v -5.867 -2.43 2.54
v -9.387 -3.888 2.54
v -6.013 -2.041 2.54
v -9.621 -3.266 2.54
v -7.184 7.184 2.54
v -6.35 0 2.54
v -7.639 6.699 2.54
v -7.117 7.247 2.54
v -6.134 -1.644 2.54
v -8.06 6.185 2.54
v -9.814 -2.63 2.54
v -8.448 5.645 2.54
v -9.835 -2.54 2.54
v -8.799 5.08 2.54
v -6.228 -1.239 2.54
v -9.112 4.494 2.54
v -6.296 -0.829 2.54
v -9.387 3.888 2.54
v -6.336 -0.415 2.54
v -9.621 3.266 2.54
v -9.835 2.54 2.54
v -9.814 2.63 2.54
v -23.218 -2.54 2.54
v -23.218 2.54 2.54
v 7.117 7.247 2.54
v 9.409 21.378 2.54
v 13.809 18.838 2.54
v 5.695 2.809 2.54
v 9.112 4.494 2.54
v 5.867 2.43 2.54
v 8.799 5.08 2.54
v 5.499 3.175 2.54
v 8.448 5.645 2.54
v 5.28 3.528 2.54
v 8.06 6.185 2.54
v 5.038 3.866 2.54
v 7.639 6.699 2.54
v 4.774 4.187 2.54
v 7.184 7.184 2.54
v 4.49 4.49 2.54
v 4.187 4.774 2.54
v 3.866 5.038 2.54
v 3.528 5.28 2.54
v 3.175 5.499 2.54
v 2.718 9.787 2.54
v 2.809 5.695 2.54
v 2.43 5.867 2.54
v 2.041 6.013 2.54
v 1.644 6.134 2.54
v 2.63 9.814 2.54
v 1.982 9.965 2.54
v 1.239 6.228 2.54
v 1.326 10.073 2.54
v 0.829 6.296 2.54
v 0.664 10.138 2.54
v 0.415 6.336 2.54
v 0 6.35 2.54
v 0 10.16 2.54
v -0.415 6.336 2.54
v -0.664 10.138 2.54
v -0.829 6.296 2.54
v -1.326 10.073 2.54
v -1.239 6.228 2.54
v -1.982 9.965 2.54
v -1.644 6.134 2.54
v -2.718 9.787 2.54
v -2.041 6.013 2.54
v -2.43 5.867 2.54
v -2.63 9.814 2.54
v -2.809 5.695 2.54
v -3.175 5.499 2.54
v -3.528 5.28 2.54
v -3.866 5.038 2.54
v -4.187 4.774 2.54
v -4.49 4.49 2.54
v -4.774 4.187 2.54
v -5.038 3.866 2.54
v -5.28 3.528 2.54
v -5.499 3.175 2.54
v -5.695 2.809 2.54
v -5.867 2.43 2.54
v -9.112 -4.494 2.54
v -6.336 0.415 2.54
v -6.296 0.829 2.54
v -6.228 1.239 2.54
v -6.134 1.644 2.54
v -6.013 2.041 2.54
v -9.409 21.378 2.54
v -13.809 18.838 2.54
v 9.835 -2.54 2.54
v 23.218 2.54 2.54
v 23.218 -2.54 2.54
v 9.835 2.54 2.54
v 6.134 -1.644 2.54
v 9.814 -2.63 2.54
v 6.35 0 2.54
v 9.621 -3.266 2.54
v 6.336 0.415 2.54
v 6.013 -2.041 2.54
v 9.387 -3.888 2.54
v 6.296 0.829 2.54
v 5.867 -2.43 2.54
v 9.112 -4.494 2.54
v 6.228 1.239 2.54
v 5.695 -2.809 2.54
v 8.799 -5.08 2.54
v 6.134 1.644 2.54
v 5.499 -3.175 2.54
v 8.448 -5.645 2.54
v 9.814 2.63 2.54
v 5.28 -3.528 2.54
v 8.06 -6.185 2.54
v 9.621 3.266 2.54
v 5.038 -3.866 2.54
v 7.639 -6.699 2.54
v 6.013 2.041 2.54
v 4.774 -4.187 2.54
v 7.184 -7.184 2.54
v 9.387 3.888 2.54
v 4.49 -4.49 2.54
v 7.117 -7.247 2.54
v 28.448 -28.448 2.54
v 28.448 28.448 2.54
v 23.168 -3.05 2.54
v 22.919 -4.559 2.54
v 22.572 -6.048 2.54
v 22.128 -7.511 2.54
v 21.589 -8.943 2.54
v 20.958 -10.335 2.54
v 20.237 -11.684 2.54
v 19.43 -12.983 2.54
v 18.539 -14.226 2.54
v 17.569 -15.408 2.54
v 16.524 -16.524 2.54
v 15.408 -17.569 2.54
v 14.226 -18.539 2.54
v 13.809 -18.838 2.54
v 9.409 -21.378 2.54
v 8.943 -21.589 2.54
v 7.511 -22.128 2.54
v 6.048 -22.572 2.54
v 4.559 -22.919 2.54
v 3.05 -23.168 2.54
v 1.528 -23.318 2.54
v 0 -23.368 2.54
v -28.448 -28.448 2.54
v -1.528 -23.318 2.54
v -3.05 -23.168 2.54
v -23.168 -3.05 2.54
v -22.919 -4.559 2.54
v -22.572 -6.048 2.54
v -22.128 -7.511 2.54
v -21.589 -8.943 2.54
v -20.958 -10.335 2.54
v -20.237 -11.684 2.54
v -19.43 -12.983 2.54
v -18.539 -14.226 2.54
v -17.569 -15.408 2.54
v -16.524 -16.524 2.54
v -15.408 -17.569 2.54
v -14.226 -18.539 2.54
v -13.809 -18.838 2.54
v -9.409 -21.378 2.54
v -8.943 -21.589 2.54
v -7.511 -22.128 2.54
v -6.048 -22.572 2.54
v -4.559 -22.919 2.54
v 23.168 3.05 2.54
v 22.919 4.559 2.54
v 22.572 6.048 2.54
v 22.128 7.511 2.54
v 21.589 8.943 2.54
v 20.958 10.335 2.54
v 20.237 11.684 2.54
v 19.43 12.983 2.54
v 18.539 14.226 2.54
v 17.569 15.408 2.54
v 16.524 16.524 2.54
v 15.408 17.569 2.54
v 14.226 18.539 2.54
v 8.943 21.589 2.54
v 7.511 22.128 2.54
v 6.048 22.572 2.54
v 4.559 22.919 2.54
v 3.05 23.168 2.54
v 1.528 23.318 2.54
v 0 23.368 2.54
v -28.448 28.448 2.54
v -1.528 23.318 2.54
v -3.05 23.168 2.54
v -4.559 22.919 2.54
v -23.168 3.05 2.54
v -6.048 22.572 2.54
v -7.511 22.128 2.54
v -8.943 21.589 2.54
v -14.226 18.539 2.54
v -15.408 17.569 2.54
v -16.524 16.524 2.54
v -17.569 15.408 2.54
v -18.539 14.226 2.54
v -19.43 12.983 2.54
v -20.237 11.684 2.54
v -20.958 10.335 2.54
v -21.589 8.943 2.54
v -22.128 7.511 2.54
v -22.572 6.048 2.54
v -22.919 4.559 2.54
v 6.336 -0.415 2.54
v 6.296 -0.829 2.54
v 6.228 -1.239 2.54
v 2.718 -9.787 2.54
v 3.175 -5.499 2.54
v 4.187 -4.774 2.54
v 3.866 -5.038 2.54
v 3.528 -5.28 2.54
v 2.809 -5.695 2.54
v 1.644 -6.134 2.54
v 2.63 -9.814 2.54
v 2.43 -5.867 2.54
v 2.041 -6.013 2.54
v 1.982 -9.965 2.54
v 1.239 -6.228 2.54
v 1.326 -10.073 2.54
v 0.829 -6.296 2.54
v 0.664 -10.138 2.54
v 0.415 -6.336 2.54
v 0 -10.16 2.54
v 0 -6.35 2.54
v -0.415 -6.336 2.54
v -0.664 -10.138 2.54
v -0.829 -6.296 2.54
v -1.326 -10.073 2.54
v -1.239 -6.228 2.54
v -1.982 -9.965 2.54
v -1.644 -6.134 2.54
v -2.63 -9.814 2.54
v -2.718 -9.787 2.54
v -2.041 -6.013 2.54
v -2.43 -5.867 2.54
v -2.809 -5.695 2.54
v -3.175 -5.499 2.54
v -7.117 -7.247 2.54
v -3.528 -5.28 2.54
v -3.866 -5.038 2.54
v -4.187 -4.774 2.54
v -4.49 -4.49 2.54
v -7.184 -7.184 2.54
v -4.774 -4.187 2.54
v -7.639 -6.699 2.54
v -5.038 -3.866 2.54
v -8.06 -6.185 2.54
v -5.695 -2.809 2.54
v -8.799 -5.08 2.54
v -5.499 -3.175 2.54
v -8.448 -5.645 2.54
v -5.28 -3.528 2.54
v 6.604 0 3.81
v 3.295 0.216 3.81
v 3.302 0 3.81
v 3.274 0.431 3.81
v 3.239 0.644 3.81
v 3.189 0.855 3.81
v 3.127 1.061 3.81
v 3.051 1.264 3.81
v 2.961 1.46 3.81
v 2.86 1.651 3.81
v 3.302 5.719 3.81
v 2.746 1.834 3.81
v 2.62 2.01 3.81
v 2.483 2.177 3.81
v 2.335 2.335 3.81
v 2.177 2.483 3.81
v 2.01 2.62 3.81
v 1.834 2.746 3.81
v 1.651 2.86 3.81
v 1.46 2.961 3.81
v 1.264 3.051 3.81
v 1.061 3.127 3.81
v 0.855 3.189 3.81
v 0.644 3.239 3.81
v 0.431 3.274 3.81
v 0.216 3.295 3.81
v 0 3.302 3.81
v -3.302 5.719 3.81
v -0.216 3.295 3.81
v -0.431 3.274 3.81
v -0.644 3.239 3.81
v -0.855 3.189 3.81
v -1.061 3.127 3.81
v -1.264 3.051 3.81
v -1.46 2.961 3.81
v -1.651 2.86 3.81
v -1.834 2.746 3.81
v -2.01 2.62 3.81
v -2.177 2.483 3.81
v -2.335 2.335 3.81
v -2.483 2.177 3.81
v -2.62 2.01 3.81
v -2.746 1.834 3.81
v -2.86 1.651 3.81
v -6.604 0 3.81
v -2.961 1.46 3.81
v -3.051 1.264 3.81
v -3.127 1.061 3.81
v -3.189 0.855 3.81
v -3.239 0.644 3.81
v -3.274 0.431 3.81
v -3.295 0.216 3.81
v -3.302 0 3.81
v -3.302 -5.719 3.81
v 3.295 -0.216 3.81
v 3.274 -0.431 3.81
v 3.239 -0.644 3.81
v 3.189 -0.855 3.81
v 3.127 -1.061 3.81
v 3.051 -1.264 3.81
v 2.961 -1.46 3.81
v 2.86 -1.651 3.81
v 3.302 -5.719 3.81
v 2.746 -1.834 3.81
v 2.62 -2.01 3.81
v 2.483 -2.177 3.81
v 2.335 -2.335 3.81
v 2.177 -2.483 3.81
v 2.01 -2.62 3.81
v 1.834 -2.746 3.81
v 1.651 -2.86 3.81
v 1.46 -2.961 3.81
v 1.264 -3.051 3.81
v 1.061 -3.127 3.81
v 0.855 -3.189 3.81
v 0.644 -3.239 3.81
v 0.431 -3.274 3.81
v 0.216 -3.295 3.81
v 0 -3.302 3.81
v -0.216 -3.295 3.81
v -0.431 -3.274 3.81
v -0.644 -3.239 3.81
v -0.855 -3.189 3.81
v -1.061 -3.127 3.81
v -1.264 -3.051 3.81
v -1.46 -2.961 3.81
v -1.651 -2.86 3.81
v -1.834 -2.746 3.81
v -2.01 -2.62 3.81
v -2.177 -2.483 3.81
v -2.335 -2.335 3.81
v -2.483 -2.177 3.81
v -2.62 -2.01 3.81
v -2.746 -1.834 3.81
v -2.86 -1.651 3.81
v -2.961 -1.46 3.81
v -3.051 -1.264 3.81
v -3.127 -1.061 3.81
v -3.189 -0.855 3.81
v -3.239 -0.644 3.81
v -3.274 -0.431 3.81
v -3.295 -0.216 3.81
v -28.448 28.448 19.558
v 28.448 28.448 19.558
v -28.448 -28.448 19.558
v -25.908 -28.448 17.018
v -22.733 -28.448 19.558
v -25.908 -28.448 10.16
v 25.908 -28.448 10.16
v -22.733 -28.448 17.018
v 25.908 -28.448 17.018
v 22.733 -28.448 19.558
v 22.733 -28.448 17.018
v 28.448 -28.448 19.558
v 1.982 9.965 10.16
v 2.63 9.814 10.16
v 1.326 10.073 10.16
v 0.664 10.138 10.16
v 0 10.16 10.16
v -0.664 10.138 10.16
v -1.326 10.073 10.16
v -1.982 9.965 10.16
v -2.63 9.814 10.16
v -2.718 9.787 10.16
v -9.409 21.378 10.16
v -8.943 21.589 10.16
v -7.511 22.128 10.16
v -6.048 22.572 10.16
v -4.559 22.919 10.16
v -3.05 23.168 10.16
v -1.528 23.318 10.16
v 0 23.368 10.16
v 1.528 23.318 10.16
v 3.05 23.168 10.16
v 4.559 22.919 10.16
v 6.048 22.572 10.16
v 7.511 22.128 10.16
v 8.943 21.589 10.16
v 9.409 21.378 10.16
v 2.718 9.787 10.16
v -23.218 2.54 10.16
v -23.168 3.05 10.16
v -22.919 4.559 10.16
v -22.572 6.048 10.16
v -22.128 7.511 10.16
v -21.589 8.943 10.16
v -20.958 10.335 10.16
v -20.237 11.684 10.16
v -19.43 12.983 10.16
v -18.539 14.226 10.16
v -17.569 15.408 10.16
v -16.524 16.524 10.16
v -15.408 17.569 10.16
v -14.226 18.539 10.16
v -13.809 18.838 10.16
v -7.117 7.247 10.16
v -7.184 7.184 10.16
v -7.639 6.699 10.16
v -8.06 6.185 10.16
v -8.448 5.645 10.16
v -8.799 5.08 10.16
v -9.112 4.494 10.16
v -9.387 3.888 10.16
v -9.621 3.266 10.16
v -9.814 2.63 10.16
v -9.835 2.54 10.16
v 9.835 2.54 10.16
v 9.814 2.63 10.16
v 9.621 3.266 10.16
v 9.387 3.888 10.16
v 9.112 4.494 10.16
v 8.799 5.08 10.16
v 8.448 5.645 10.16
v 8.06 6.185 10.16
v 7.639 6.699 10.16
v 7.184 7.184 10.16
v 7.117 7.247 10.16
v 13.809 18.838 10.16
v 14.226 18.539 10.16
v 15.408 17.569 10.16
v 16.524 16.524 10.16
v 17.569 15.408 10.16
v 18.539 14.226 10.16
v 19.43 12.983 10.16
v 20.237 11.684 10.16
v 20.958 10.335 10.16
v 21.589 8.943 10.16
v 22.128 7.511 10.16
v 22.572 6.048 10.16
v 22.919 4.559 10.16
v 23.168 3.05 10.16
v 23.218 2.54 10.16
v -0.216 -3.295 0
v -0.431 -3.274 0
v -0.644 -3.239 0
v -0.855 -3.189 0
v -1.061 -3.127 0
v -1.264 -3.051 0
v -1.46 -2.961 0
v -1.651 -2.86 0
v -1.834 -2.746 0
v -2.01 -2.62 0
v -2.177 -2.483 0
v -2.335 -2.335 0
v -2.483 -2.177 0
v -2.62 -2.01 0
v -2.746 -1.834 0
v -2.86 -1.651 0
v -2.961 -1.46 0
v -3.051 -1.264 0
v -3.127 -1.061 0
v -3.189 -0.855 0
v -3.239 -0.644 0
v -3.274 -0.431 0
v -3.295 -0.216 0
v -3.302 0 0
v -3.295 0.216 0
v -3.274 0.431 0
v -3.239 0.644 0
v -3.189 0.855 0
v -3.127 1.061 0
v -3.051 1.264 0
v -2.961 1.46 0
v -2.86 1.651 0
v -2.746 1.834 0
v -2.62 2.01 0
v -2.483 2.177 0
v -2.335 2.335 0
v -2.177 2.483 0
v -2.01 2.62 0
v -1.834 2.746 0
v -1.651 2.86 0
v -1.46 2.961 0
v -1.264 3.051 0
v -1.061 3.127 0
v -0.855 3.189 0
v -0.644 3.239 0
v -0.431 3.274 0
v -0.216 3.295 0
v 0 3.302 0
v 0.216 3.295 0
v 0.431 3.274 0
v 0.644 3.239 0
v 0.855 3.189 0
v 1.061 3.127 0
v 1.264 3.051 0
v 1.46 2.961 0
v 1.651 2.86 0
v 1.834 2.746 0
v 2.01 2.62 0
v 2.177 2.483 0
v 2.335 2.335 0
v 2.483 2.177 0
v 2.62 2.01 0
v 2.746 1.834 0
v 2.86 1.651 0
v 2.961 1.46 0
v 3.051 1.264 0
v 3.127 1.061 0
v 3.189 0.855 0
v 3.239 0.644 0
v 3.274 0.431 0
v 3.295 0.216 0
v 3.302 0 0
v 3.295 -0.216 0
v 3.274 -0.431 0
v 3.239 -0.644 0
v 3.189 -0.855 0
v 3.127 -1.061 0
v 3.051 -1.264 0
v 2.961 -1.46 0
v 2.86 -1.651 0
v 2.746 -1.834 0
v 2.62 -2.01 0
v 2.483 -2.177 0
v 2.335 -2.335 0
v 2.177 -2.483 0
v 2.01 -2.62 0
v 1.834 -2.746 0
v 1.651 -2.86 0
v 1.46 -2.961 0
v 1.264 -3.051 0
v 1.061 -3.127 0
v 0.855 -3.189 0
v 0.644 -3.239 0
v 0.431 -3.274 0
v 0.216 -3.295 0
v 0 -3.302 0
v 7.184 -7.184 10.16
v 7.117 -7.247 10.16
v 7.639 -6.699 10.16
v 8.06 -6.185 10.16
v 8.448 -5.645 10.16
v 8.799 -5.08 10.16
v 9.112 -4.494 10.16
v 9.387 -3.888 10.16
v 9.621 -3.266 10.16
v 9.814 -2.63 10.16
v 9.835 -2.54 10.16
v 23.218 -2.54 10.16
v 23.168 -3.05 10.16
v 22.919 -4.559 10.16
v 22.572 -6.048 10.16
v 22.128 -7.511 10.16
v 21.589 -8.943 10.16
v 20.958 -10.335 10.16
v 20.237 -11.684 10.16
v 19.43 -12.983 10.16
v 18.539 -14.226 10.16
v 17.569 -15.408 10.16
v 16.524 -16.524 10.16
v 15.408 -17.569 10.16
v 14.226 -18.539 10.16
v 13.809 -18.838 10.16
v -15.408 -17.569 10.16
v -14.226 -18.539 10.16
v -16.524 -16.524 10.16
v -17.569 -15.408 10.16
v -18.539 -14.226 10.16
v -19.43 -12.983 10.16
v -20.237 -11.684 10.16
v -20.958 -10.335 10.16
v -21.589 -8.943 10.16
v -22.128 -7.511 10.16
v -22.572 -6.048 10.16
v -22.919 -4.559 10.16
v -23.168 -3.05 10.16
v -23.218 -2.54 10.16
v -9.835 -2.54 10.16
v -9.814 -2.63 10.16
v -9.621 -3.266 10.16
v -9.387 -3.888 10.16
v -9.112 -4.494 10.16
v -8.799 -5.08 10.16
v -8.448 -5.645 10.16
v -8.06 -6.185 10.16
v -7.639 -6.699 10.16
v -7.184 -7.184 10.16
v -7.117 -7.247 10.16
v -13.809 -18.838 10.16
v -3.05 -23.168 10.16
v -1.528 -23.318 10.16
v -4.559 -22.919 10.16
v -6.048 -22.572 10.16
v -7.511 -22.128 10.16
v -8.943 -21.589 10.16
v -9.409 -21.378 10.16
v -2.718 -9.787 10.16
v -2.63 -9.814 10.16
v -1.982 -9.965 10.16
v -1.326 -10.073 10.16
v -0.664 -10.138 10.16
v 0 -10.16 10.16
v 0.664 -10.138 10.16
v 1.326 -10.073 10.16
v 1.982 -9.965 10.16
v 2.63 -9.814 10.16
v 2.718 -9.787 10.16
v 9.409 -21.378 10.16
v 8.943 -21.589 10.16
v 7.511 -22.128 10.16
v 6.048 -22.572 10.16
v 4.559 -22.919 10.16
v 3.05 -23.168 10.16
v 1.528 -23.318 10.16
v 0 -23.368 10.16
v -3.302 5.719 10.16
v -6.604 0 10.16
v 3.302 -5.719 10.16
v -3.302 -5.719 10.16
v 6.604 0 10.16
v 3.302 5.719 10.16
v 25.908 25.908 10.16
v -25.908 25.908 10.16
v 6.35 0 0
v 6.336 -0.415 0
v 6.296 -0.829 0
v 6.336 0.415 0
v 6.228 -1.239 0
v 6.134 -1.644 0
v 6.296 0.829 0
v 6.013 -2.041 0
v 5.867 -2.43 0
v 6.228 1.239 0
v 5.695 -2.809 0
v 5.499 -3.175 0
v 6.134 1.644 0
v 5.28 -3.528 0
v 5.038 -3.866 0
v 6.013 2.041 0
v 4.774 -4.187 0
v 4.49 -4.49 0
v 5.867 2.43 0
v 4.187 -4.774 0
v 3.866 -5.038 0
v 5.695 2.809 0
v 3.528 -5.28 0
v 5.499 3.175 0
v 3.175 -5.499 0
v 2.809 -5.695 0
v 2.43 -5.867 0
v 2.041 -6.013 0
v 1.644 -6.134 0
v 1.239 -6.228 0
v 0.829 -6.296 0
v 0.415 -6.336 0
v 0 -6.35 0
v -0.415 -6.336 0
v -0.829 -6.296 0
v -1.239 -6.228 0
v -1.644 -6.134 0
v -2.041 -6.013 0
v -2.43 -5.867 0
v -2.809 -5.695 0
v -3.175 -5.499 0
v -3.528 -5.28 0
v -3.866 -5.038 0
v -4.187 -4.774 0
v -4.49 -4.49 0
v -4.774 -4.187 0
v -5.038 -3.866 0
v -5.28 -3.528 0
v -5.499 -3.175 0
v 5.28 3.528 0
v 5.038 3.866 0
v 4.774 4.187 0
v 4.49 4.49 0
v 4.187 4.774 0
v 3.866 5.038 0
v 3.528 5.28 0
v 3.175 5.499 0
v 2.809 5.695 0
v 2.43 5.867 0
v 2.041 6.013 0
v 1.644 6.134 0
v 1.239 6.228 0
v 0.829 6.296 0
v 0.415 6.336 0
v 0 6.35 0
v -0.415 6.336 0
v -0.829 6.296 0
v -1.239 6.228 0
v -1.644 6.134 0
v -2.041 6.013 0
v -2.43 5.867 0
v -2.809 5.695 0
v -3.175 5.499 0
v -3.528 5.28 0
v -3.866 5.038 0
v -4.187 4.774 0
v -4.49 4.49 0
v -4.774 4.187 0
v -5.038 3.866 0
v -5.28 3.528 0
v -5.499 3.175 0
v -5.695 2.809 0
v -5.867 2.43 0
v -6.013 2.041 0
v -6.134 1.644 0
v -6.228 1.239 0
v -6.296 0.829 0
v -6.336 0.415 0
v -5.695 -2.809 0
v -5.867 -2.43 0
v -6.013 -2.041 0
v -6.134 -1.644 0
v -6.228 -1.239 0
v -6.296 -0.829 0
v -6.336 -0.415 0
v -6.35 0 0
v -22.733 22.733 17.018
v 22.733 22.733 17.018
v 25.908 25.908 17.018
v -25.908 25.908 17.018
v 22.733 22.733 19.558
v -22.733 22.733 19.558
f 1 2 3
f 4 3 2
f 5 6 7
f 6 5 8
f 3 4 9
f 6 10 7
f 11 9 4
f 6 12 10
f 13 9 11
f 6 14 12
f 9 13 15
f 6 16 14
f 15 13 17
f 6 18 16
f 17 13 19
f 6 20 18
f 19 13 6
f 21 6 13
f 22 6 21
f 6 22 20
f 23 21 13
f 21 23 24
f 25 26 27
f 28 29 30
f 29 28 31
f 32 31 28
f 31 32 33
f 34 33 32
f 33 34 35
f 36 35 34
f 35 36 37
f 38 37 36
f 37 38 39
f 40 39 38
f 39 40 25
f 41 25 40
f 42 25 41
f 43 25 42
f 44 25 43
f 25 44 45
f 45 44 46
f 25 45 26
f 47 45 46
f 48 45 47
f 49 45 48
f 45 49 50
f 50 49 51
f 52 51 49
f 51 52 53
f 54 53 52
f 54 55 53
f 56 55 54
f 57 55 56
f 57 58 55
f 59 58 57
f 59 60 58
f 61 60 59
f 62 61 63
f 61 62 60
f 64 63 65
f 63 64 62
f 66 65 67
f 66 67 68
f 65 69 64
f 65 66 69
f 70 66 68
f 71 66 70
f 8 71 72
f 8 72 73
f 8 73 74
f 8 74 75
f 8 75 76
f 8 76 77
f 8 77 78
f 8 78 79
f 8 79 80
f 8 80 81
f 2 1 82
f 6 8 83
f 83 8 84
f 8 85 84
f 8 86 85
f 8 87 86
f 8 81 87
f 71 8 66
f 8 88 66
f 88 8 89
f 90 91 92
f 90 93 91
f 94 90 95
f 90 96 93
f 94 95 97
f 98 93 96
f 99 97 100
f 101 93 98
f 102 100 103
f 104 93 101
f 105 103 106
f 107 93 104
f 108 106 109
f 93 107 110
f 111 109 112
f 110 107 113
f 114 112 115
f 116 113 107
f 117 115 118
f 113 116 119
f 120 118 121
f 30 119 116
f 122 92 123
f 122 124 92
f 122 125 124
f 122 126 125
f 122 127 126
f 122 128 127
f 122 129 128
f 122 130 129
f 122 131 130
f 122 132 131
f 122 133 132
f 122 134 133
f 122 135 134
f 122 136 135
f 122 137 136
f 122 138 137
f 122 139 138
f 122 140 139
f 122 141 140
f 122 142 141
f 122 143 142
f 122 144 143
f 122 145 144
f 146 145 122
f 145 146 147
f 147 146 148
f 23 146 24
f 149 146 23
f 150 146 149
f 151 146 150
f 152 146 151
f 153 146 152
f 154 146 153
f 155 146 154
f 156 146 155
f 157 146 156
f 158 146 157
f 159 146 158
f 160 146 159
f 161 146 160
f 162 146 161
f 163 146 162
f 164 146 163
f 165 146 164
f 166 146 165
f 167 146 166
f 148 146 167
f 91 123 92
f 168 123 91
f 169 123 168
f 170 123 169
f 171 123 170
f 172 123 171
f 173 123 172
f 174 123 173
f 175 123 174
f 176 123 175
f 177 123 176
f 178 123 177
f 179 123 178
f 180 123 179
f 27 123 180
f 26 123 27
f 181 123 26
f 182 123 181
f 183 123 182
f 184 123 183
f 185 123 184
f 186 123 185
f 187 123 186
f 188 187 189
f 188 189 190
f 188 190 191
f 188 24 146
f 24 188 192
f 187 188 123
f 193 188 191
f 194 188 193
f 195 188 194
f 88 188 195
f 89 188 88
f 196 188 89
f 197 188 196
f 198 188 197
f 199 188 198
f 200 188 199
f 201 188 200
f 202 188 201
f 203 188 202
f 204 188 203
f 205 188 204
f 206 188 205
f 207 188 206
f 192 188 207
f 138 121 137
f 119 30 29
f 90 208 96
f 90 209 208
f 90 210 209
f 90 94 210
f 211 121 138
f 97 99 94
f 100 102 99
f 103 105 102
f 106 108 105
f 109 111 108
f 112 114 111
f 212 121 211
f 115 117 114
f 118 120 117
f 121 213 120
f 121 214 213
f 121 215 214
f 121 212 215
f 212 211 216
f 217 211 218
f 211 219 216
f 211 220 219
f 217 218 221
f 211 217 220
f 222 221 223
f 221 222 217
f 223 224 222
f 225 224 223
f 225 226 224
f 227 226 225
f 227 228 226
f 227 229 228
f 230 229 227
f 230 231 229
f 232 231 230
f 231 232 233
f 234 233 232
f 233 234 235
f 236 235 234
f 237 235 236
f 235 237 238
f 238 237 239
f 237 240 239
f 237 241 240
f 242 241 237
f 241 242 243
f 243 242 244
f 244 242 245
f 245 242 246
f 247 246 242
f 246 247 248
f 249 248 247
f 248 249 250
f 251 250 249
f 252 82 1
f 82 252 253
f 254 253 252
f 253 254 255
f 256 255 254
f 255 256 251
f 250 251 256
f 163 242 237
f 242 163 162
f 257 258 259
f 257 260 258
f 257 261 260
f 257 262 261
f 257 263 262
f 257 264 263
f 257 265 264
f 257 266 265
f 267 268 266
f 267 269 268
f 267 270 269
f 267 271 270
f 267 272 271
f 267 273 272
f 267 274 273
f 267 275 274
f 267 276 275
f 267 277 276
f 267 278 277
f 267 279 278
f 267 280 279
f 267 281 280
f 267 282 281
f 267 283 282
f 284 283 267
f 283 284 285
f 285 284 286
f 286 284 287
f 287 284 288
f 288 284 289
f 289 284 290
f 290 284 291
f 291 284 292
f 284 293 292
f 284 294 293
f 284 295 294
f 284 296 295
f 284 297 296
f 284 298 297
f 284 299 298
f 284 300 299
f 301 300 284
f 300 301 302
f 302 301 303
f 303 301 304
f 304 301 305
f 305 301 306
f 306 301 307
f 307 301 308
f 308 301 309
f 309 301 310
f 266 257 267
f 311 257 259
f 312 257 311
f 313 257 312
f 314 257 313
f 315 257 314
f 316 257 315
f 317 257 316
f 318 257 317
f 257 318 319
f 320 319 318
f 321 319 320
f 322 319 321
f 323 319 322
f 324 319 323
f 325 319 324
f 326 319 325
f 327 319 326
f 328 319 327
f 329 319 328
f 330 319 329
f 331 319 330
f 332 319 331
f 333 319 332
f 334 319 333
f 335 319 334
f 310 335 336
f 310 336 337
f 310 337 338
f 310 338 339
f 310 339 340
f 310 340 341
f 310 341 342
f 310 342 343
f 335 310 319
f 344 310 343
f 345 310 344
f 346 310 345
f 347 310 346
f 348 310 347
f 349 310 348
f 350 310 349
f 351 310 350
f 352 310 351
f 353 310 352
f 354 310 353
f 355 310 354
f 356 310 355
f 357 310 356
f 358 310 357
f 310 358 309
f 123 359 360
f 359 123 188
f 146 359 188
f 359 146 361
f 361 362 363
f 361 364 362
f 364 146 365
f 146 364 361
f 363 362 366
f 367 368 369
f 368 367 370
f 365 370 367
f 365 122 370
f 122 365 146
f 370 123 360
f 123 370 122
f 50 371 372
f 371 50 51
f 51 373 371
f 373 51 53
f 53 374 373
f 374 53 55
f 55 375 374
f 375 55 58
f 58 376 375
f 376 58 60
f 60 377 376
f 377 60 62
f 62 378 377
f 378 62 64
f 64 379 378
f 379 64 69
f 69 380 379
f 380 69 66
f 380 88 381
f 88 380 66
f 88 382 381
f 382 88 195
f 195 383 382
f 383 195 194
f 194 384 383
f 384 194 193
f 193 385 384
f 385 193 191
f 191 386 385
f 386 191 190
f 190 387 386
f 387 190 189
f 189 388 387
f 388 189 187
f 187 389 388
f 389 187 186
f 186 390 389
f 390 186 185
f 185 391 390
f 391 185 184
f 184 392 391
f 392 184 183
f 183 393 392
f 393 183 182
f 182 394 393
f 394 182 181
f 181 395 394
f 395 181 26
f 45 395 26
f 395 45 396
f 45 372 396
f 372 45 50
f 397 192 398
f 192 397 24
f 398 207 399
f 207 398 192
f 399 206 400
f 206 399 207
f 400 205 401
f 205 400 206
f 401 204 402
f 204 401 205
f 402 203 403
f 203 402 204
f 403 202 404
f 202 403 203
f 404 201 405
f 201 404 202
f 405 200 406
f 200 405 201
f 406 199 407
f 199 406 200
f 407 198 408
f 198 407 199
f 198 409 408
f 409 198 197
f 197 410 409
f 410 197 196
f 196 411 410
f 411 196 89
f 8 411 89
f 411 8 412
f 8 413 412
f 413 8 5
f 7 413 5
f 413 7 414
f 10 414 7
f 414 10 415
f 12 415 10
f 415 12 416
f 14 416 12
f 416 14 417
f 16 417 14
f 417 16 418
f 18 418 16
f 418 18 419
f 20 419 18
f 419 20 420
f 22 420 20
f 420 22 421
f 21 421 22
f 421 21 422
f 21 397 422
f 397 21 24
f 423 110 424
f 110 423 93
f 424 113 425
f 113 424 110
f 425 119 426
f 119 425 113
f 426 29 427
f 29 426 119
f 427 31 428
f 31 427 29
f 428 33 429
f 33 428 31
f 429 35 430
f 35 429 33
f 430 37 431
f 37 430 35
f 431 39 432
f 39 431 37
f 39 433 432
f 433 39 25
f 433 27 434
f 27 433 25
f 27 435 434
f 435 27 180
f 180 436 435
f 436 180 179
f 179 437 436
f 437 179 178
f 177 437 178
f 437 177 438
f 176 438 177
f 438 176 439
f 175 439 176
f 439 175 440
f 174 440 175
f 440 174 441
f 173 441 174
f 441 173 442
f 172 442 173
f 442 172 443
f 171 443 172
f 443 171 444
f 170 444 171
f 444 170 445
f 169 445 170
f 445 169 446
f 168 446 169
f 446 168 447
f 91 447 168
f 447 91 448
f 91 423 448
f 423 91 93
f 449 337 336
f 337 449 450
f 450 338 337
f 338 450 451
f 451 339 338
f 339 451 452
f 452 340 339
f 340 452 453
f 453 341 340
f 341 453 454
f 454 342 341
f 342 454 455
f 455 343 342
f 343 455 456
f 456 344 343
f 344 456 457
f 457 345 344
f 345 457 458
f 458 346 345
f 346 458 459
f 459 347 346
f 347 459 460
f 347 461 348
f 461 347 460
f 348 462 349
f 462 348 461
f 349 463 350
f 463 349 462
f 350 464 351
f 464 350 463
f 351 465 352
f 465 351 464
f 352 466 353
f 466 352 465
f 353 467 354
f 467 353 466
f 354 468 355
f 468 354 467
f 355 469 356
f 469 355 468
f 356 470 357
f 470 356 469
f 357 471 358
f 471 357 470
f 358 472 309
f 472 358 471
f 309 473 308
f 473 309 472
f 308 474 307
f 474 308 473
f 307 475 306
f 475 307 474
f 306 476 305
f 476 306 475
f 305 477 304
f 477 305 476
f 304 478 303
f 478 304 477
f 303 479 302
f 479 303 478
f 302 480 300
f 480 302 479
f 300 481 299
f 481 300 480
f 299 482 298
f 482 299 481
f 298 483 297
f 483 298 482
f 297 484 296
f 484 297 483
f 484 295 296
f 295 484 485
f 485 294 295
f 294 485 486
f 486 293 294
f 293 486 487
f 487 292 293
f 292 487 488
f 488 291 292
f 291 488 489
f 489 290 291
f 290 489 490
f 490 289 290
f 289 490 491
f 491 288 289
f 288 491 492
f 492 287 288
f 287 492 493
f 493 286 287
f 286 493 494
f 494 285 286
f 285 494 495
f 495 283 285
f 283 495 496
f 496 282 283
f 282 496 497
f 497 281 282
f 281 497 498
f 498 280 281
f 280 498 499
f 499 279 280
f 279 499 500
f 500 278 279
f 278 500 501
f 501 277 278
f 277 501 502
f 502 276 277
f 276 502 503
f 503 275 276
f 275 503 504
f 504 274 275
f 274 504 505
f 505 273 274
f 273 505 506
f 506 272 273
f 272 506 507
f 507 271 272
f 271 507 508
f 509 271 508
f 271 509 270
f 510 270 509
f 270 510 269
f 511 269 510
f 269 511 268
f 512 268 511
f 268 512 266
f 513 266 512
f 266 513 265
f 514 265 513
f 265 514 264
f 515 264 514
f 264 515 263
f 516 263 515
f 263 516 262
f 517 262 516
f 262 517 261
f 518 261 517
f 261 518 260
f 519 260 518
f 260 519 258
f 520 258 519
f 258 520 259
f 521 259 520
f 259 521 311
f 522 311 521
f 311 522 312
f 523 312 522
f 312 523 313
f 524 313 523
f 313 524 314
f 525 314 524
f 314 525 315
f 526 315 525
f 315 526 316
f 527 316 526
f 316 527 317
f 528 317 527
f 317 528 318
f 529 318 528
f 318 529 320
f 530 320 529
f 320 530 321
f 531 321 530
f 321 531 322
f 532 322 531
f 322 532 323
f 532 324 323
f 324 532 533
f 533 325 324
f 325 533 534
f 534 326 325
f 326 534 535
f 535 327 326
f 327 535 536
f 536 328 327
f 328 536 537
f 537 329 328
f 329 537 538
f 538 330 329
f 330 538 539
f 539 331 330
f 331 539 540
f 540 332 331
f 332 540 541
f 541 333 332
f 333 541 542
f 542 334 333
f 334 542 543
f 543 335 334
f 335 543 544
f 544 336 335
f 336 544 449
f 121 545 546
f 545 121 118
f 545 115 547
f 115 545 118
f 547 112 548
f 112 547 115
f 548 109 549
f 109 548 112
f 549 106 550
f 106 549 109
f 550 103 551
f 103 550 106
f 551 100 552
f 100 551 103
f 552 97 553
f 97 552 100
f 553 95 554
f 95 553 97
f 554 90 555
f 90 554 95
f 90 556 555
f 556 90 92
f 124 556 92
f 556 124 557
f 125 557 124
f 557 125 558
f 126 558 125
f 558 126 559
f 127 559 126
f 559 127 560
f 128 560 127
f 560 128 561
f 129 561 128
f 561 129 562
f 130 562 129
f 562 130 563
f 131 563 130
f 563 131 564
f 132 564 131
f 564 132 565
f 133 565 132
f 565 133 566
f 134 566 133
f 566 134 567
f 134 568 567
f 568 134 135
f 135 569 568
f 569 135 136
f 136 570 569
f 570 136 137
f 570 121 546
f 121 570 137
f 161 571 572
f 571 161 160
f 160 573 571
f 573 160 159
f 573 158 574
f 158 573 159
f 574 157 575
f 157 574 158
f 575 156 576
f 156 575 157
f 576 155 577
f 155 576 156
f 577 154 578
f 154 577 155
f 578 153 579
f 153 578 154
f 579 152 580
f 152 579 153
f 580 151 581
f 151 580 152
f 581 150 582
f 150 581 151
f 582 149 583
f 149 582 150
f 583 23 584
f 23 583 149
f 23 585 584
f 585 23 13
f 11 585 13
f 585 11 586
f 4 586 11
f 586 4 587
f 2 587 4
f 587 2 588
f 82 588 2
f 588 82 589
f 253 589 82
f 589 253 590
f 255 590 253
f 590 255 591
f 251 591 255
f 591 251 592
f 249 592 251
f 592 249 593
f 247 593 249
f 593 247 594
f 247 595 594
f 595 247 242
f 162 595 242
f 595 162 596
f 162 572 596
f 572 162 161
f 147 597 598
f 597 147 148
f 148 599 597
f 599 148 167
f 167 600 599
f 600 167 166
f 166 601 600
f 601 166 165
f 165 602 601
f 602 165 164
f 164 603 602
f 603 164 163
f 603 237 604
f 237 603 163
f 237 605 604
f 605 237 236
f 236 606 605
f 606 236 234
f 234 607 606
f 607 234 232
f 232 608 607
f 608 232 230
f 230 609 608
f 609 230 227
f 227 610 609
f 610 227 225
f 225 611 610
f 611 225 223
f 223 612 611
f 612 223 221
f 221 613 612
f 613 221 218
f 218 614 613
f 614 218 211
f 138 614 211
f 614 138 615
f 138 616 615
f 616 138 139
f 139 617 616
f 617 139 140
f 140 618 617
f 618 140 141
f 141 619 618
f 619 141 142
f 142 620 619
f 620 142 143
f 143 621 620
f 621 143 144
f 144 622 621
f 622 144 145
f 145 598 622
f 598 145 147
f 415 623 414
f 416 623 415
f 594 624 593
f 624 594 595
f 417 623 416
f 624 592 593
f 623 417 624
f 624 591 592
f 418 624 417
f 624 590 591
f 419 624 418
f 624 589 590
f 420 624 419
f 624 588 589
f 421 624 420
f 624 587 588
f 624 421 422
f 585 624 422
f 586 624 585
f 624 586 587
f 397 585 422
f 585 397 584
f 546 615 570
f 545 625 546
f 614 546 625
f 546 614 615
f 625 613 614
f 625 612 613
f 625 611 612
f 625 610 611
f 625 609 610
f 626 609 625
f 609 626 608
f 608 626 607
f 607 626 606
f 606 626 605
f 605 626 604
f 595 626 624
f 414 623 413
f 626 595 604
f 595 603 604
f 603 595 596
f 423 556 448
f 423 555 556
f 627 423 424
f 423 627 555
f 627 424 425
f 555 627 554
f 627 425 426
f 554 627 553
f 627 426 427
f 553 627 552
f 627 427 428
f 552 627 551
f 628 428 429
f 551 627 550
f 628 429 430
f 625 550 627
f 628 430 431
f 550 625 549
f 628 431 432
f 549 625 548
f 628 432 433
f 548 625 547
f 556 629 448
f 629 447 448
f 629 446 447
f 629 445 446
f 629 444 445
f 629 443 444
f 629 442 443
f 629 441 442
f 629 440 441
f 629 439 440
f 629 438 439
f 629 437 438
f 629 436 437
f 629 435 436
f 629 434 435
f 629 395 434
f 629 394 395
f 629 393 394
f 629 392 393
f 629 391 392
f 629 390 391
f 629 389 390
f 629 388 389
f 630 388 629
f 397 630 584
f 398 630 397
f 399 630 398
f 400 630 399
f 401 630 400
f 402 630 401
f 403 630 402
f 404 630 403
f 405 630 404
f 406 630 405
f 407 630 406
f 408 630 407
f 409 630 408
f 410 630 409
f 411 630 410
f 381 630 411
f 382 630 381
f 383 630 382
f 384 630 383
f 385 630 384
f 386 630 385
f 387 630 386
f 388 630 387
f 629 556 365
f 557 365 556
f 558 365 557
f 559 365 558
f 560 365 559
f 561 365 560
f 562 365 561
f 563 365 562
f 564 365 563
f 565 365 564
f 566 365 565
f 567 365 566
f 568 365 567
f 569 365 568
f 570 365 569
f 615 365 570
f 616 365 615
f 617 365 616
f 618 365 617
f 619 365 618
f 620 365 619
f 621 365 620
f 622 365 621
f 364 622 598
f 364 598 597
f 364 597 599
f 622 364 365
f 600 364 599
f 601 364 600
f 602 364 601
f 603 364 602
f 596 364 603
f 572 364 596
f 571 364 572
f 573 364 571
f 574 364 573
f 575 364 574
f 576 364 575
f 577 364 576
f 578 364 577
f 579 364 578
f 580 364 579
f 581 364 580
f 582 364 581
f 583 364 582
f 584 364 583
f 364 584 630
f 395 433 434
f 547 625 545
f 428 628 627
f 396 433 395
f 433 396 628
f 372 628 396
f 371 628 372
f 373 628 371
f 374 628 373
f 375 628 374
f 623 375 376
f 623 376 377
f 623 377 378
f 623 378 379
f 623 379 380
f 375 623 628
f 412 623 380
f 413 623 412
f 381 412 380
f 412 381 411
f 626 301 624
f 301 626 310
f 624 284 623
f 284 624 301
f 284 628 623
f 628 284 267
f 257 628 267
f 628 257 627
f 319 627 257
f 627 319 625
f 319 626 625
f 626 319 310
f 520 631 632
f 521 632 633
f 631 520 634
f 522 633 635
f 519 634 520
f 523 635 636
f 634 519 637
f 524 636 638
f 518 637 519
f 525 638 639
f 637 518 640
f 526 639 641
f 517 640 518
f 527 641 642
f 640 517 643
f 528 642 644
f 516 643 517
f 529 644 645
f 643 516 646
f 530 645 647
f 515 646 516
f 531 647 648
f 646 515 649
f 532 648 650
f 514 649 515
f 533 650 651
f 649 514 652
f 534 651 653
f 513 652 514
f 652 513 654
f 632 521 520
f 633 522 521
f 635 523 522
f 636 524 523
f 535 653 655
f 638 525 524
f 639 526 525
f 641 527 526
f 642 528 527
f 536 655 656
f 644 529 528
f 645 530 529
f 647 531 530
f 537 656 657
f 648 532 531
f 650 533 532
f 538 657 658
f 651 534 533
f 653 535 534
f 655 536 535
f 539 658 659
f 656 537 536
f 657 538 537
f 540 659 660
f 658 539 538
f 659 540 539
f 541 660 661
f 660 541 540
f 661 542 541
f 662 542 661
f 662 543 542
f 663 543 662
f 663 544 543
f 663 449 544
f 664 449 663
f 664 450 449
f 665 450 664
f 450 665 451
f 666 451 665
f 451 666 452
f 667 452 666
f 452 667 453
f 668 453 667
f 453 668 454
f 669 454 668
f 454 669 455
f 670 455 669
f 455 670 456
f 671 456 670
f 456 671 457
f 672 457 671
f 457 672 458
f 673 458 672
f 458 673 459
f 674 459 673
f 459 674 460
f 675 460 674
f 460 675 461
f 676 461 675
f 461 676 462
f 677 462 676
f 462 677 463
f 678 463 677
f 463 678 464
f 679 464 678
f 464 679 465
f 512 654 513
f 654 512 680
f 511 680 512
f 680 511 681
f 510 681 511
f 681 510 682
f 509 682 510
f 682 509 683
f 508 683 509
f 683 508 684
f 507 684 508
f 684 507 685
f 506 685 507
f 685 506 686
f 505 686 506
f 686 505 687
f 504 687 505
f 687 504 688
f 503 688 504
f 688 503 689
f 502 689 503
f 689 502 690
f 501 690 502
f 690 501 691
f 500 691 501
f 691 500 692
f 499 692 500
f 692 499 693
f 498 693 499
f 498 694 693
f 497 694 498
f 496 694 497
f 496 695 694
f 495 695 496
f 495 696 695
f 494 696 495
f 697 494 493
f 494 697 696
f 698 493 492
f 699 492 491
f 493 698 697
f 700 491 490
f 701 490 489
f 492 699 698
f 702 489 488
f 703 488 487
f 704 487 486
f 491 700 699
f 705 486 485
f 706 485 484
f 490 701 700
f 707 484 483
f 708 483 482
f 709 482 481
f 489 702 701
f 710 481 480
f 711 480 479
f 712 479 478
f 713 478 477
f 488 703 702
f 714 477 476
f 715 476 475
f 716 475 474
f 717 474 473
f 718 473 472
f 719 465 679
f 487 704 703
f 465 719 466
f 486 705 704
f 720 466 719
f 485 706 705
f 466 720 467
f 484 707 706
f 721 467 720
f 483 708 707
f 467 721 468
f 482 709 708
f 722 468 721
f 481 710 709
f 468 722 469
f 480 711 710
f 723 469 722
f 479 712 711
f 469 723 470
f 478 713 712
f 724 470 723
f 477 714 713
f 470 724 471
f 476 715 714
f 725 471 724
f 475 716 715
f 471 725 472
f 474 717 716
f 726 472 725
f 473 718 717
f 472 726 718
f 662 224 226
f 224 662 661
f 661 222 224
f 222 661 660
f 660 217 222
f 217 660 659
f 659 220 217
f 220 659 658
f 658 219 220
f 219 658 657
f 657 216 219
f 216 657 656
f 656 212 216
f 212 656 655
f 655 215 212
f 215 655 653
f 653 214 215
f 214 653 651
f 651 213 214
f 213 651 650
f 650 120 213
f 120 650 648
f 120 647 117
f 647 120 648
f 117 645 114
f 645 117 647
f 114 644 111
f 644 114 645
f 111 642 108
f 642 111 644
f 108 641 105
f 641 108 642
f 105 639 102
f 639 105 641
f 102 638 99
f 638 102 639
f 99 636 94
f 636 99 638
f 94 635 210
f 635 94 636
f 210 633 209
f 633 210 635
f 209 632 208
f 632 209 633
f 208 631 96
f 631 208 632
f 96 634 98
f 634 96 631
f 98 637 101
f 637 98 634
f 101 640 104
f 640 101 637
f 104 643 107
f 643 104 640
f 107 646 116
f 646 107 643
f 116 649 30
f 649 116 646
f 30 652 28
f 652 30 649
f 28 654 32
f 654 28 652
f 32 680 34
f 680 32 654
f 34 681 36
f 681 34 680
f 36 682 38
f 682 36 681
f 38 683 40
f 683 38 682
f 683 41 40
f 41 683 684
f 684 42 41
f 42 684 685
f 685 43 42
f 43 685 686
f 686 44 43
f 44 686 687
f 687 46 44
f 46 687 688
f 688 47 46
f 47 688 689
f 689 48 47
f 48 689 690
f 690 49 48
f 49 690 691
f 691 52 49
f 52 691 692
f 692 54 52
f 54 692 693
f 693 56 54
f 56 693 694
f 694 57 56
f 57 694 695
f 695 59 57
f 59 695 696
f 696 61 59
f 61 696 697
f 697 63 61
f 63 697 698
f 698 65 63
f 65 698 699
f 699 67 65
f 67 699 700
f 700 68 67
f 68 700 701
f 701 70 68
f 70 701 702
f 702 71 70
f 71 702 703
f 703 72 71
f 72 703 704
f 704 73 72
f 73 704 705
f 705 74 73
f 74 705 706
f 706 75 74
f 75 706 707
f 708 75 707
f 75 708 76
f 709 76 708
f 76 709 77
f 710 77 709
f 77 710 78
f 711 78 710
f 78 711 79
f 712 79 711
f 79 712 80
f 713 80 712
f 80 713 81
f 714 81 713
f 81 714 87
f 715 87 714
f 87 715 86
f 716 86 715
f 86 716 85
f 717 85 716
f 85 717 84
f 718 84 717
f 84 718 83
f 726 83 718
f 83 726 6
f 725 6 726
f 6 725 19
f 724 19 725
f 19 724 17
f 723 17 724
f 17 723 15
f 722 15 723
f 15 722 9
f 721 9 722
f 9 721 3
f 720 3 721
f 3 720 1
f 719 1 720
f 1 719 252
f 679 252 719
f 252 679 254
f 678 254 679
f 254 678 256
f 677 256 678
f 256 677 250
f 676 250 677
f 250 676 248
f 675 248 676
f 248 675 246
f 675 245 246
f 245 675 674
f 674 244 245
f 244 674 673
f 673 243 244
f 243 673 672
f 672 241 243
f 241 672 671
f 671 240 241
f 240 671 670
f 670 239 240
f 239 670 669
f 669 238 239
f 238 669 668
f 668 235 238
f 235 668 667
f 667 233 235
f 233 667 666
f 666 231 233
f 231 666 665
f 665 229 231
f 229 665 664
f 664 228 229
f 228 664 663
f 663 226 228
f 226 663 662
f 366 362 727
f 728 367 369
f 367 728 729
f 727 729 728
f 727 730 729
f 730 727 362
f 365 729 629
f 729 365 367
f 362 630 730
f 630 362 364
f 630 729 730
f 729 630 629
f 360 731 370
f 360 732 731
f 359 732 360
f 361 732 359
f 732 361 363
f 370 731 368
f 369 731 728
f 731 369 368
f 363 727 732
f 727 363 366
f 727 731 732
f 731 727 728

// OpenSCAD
ViewScale = [0.0254, 0.0254, 0.0254];

module segments()
{
    segs = 6;
    outer = 2240/2;
    inner = 1840/2;
    hub = 400;
    difference() {
        circle(outer, $fn=96);
    circle(hub, $fn=96);
    difference() {
    circle(outer, $fn=96);
    circle(inner, $fn=96);
    }
    for (isegs = [0: segs])
    {
        rotate([0, 0, isegs*(360/segs)])
        square([10+2*inner, 200], center=true);
    }
    }
}

module base()
{
    // hole only
    translate([0, 0, 100])
    linear_extrude(50)
    difference() {
        square(2240, center=true);
        segments();
//    circle(1130, $fn=96);
    circle(130, $fn=96);
    }

    // hex nut cutout
    translate([0, 0, 150])
    linear_extrude(250)
    difference() {
        square(2240, center=true);
        segments();
//    circle(1130, $fn=96);
    circle(130, $fn=96);
    circle(260, $fn=6);
    }

    // projection into depression
    //#translate([0, 0, 450])
    linear_extrude(102)
    difference() {
        circle(250, $fn=96);
        circle(130, $fn=96);
    }
}

module camera_mount()
{
    // sides
    linear_extrude(270)
    difference() {
    square(2240, center=true);
    square(2040, center=true);
    translate([0, -200, 0])
    square(2040, center=true);
    }

    // top
    translate([0, 0, 270])
    linear_extrude(100)
    difference() {
    square(2240, center=true);
    square(1790, center=true);
    translate([0, -300, 0])
    square(1790, center=true);
    }
}

scale(ViewScale)
{
    base();
    translate([0, 0, 400])
    camera_mount();

}
